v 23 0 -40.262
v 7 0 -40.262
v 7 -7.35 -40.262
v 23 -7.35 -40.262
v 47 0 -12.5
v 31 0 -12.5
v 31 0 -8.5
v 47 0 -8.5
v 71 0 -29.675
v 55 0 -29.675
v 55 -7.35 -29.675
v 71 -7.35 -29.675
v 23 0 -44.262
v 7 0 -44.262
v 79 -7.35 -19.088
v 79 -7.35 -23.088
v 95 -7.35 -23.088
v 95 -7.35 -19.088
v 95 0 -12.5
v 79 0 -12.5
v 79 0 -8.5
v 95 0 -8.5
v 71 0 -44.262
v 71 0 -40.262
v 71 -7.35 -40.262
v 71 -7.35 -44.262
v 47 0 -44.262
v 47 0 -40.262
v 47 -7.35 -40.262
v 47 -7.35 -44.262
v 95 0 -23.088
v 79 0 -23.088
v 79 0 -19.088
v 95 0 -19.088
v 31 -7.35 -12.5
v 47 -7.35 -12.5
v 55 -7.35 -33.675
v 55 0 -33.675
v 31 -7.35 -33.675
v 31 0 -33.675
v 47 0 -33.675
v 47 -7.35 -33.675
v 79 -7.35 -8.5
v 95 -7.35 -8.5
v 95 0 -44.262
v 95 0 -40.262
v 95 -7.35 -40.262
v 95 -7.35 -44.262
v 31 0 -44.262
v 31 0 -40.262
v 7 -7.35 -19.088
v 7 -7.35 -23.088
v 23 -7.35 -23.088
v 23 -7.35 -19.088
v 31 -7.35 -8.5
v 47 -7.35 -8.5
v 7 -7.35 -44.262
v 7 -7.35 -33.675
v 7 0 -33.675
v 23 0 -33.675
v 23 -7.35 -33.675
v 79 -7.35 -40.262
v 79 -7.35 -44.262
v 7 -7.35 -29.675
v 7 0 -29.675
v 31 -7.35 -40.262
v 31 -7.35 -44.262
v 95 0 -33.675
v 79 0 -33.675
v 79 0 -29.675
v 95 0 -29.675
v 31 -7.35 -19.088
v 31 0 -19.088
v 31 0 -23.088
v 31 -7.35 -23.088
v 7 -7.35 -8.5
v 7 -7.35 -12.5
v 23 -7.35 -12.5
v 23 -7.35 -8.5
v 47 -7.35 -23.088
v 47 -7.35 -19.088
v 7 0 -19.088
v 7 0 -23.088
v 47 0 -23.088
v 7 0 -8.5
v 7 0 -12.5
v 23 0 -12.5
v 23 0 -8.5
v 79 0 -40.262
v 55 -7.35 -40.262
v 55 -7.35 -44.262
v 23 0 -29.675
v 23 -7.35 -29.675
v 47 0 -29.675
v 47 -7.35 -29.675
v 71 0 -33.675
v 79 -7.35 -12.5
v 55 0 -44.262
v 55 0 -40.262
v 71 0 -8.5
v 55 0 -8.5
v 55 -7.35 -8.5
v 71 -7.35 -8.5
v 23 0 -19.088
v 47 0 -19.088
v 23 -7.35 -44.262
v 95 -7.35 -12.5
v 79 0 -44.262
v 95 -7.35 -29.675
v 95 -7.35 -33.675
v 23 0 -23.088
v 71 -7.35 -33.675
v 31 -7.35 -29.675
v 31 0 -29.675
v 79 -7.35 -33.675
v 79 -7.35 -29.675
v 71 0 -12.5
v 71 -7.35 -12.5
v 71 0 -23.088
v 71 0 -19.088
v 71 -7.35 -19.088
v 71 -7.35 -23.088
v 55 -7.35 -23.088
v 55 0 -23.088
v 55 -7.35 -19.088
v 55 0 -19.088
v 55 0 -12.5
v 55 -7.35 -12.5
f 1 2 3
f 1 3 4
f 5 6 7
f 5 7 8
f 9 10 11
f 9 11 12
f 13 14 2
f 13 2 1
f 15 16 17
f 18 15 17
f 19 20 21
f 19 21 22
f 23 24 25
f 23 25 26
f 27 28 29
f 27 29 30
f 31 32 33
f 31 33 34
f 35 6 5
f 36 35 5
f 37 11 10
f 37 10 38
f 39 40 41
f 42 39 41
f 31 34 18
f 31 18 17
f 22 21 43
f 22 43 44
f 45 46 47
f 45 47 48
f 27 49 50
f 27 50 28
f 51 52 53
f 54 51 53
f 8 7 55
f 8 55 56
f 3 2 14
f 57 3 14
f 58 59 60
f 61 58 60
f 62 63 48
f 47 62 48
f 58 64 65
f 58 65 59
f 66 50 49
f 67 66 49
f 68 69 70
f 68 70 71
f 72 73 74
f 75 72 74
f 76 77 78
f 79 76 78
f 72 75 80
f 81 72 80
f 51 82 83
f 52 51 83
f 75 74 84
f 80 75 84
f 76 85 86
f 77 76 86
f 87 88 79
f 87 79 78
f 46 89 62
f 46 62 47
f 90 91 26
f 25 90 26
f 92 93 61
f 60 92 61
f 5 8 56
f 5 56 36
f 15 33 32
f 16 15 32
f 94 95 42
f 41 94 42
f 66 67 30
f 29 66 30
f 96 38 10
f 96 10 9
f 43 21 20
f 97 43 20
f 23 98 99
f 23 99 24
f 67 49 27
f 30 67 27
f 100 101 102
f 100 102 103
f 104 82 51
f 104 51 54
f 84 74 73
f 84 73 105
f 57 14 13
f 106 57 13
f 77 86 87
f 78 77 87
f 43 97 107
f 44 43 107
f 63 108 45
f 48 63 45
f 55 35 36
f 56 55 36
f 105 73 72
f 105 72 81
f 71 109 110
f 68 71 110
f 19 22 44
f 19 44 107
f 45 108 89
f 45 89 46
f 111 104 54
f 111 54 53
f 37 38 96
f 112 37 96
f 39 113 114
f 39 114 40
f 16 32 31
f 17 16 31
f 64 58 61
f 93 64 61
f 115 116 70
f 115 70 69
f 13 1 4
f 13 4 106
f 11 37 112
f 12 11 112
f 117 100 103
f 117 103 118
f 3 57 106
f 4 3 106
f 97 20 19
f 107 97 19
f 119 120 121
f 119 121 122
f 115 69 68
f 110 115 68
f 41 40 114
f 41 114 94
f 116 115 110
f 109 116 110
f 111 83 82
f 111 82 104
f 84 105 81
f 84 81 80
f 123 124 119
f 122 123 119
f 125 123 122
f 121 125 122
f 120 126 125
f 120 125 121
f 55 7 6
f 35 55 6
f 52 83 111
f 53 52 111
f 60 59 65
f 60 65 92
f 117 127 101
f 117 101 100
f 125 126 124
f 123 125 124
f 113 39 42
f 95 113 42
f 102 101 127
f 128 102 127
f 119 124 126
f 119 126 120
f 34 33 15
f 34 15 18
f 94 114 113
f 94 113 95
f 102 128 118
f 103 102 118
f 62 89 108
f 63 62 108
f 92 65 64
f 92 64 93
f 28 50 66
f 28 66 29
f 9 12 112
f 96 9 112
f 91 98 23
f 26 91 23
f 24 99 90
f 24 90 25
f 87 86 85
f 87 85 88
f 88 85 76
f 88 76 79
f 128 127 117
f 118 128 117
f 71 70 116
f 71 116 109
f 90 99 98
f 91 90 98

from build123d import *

# Parameters (mm, degrees)
SKETCH1_W              = 16
SKETCH1_H              = 4
BOSS_EXTRUDE1_DEPTH    = 7.35
BOSS_EXTRUDE1_2_DEPTH  = 7.35
BOSS_EXTRUDE1_3_DEPTH  = 7.35
BOSS_EXTRUDE1_4_DEPTH  = 7.35
BOSS_EXTRUDE1_5_DEPTH  = 7.35
BOSS_EXTRUDE1_6_DEPTH  = 7.35
BOSS_EXTRUDE1_7_DEPTH  = 7.35
BOSS_EXTRUDE1_8_DEPTH  = 7.35
BOSS_EXTRUDE1_9_DEPTH  = 7.35
BOSS_EXTRUDE1_10_DEPTH = 7.35
BOSS_EXTRUDE1_11_DEPTH = 7.35
BOSS_EXTRUDE1_12_DEPTH = 7.35
BOSS_EXTRUDE1_13_DEPTH = 7.35
BOSS_EXTRUDE1_14_DEPTH = 7.35
BOSS_EXTRUDE1_15_DEPTH = 7.35
BOSS_EXTRUDE1_16_DEPTH = 7.35


with BuildPart() as part:
    # Sketch1 → Boss-Extrude1 (new body)
    with BuildSketch(Plane(origin=(0, 0, 0), x_dir=(1, 0, 0), z_dir=(0, 1, 0))):
        with Locations((39, 10.5)):
            Rectangle(SKETCH1_W, SKETCH1_H)
    extrude(amount=-BOSS_EXTRUDE1_DEPTH)


with BuildPart() as body_2:
    # Sketch1 → Boss-Extrude1 2 (new body)
    with BuildSketch(Plane(origin=(0, 0, 0), x_dir=(1, 0, 0), z_dir=(0, 1, 0))):
        with Locations((15, 10.5)):
            Rectangle(SKETCH1_W, SKETCH1_H)
    extrude(amount=-BOSS_EXTRUDE1_2_DEPTH)


with BuildPart() as body_3:
    # Sketch1 → Boss-Extrude1 3 (new body)
    with BuildSketch(Plane(origin=(0, 0, 0), x_dir=(1, 0, 0), z_dir=(0, 1, 0))):
        with Locations((63, 10.5)):
            Rectangle(SKETCH1_W, SKETCH1_H)
    extrude(amount=-BOSS_EXTRUDE1_3_DEPTH)


with BuildPart() as body_4:
    # Sketch1 → Boss-Extrude1 4 (new body)
    with BuildSketch(Plane(origin=(0, 0, 0), x_dir=(1, 0, 0), z_dir=(0, 1, 0))):
        with Locations((87, 10.5)):
            Rectangle(SKETCH1_W, SKETCH1_H)
    extrude(amount=-BOSS_EXTRUDE1_4_DEPTH)


with BuildPart() as body_5:
    # Sketch1 → Boss-Extrude1 5 (new body)
    with BuildSketch(Plane(origin=(0, 0, 0), x_dir=(1, 0, 0), z_dir=(0, 1, 0))):
        with Locations((15, 21.0875)):
            Rectangle(SKETCH1_W, SKETCH1_H)
    extrude(amount=-BOSS_EXTRUDE1_5_DEPTH)


with BuildPart() as body_6:
    # Sketch1 → Boss-Extrude1 6 (new body)
    with BuildSketch(Plane(origin=(0, 0, 0), x_dir=(1, 0, 0), z_dir=(0, 1, 0))):
        with Locations((39, 21.0875)):
            Rectangle(SKETCH1_W, SKETCH1_H)
    extrude(amount=-BOSS_EXTRUDE1_6_DEPTH)


with BuildPart() as body_7:
    # Sketch1 → Boss-Extrude1 7 (new body)
    with BuildSketch(Plane(origin=(0, 0, 0), x_dir=(1, 0, 0), z_dir=(0, 1, 0))):
        with Locations((63, 21.0875)):
            Rectangle(SKETCH1_W, SKETCH1_H)
    extrude(amount=-BOSS_EXTRUDE1_7_DEPTH)


with BuildPart() as body_8:
    # Sketch1 → Boss-Extrude1 8 (new body)
    with BuildSketch(Plane(origin=(0, 0, 0), x_dir=(1, 0, 0), z_dir=(0, 1, 0))):
        with Locations((87, 21.0875)):
            Rectangle(SKETCH1_W, SKETCH1_H)
    extrude(amount=-BOSS_EXTRUDE1_8_DEPTH)


with BuildPart() as body_9:
    # Sketch1 → Boss-Extrude1 9 (new body)
    with BuildSketch(Plane(origin=(0, 0, 0), x_dir=(1, 0, 0), z_dir=(0, 1, 0))):
        with Locations((15, 31.675)):
            Rectangle(SKETCH1_W, SKETCH1_H)
    extrude(amount=-BOSS_EXTRUDE1_9_DEPTH)


with BuildPart() as body_10:
    # Sketch1 → Boss-Extrude1 10 (new body)
    with BuildSketch(Plane(origin=(0, 0, 0), x_dir=(1, 0, 0), z_dir=(0, 1, 0))):
        with Locations((39, 31.675)):
            Rectangle(SKETCH1_W, SKETCH1_H)
    extrude(amount=-BOSS_EXTRUDE1_10_DEPTH)


with BuildPart() as body_11:
    # Sketch1 → Boss-Extrude1 11 (new body)
    with BuildSketch(Plane(origin=(0, 0, 0), x_dir=(1, 0, 0), z_dir=(0, 1, 0))):
        with Locations((63, 31.675)):
            Rectangle(SKETCH1_W, SKETCH1_H)
    extrude(amount=-BOSS_EXTRUDE1_11_DEPTH)


with BuildPart() as body_12:
    # Sketch1 → Boss-Extrude1 12 (new body)
    with BuildSketch(Plane(origin=(0, 0, 0), x_dir=(1, 0, 0), z_dir=(0, 1, 0))):
        with Locations((87, 31.675)):
            Rectangle(SKETCH1_W, SKETCH1_H)
    extrude(amount=-BOSS_EXTRUDE1_12_DEPTH)


with BuildPart() as body_13:
    # Sketch1 → Boss-Extrude1 13 (new body)
    with BuildSketch(Plane(origin=(0, 0, 0), x_dir=(1, 0, 0), z_dir=(0, 1, 0))):
        with Locations((15, 42.2625)):
            Rectangle(SKETCH1_W, SKETCH1_H)
    extrude(amount=-BOSS_EXTRUDE1_13_DEPTH)


with BuildPart() as body_14:
    # Sketch1 → Boss-Extrude1 14 (new body)
    with BuildSketch(Plane(origin=(0, 0, 0), x_dir=(1, 0, 0), z_dir=(0, 1, 0))):
        with Locations((39, 42.2625)):
            Rectangle(SKETCH1_W, SKETCH1_H)
    extrude(amount=-BOSS_EXTRUDE1_14_DEPTH)


with BuildPart() as body_15:
    # Sketch1 → Boss-Extrude1 15 (new body)
    with BuildSketch(Plane(origin=(0, 0, 0), x_dir=(1, 0, 0), z_dir=(0, 1, 0))):
        with Locations((63, 42.2625)):
            Rectangle(SKETCH1_W, SKETCH1_H)
    extrude(amount=-BOSS_EXTRUDE1_15_DEPTH)


with BuildPart() as body_16:
    # Sketch1 → Boss-Extrude1 16 (new body)
    with BuildSketch(Plane(origin=(0, 0, 0), x_dir=(1, 0, 0), z_dir=(0, 1, 0))):
        with Locations((87, 42.2625)):
            Rectangle(SKETCH1_W, SKETCH1_H)
    extrude(amount=-BOSS_EXTRUDE1_16_DEPTH)


solid = Compound([part.part, body_2.part, body_3.part, body_4.part, body_5.part, body_6.part, body_7.part, body_8.part, body_9.part, body_10.part, body_11.part, body_12.part, body_13.part, body_14.part, body_15.part, body_16.part])
